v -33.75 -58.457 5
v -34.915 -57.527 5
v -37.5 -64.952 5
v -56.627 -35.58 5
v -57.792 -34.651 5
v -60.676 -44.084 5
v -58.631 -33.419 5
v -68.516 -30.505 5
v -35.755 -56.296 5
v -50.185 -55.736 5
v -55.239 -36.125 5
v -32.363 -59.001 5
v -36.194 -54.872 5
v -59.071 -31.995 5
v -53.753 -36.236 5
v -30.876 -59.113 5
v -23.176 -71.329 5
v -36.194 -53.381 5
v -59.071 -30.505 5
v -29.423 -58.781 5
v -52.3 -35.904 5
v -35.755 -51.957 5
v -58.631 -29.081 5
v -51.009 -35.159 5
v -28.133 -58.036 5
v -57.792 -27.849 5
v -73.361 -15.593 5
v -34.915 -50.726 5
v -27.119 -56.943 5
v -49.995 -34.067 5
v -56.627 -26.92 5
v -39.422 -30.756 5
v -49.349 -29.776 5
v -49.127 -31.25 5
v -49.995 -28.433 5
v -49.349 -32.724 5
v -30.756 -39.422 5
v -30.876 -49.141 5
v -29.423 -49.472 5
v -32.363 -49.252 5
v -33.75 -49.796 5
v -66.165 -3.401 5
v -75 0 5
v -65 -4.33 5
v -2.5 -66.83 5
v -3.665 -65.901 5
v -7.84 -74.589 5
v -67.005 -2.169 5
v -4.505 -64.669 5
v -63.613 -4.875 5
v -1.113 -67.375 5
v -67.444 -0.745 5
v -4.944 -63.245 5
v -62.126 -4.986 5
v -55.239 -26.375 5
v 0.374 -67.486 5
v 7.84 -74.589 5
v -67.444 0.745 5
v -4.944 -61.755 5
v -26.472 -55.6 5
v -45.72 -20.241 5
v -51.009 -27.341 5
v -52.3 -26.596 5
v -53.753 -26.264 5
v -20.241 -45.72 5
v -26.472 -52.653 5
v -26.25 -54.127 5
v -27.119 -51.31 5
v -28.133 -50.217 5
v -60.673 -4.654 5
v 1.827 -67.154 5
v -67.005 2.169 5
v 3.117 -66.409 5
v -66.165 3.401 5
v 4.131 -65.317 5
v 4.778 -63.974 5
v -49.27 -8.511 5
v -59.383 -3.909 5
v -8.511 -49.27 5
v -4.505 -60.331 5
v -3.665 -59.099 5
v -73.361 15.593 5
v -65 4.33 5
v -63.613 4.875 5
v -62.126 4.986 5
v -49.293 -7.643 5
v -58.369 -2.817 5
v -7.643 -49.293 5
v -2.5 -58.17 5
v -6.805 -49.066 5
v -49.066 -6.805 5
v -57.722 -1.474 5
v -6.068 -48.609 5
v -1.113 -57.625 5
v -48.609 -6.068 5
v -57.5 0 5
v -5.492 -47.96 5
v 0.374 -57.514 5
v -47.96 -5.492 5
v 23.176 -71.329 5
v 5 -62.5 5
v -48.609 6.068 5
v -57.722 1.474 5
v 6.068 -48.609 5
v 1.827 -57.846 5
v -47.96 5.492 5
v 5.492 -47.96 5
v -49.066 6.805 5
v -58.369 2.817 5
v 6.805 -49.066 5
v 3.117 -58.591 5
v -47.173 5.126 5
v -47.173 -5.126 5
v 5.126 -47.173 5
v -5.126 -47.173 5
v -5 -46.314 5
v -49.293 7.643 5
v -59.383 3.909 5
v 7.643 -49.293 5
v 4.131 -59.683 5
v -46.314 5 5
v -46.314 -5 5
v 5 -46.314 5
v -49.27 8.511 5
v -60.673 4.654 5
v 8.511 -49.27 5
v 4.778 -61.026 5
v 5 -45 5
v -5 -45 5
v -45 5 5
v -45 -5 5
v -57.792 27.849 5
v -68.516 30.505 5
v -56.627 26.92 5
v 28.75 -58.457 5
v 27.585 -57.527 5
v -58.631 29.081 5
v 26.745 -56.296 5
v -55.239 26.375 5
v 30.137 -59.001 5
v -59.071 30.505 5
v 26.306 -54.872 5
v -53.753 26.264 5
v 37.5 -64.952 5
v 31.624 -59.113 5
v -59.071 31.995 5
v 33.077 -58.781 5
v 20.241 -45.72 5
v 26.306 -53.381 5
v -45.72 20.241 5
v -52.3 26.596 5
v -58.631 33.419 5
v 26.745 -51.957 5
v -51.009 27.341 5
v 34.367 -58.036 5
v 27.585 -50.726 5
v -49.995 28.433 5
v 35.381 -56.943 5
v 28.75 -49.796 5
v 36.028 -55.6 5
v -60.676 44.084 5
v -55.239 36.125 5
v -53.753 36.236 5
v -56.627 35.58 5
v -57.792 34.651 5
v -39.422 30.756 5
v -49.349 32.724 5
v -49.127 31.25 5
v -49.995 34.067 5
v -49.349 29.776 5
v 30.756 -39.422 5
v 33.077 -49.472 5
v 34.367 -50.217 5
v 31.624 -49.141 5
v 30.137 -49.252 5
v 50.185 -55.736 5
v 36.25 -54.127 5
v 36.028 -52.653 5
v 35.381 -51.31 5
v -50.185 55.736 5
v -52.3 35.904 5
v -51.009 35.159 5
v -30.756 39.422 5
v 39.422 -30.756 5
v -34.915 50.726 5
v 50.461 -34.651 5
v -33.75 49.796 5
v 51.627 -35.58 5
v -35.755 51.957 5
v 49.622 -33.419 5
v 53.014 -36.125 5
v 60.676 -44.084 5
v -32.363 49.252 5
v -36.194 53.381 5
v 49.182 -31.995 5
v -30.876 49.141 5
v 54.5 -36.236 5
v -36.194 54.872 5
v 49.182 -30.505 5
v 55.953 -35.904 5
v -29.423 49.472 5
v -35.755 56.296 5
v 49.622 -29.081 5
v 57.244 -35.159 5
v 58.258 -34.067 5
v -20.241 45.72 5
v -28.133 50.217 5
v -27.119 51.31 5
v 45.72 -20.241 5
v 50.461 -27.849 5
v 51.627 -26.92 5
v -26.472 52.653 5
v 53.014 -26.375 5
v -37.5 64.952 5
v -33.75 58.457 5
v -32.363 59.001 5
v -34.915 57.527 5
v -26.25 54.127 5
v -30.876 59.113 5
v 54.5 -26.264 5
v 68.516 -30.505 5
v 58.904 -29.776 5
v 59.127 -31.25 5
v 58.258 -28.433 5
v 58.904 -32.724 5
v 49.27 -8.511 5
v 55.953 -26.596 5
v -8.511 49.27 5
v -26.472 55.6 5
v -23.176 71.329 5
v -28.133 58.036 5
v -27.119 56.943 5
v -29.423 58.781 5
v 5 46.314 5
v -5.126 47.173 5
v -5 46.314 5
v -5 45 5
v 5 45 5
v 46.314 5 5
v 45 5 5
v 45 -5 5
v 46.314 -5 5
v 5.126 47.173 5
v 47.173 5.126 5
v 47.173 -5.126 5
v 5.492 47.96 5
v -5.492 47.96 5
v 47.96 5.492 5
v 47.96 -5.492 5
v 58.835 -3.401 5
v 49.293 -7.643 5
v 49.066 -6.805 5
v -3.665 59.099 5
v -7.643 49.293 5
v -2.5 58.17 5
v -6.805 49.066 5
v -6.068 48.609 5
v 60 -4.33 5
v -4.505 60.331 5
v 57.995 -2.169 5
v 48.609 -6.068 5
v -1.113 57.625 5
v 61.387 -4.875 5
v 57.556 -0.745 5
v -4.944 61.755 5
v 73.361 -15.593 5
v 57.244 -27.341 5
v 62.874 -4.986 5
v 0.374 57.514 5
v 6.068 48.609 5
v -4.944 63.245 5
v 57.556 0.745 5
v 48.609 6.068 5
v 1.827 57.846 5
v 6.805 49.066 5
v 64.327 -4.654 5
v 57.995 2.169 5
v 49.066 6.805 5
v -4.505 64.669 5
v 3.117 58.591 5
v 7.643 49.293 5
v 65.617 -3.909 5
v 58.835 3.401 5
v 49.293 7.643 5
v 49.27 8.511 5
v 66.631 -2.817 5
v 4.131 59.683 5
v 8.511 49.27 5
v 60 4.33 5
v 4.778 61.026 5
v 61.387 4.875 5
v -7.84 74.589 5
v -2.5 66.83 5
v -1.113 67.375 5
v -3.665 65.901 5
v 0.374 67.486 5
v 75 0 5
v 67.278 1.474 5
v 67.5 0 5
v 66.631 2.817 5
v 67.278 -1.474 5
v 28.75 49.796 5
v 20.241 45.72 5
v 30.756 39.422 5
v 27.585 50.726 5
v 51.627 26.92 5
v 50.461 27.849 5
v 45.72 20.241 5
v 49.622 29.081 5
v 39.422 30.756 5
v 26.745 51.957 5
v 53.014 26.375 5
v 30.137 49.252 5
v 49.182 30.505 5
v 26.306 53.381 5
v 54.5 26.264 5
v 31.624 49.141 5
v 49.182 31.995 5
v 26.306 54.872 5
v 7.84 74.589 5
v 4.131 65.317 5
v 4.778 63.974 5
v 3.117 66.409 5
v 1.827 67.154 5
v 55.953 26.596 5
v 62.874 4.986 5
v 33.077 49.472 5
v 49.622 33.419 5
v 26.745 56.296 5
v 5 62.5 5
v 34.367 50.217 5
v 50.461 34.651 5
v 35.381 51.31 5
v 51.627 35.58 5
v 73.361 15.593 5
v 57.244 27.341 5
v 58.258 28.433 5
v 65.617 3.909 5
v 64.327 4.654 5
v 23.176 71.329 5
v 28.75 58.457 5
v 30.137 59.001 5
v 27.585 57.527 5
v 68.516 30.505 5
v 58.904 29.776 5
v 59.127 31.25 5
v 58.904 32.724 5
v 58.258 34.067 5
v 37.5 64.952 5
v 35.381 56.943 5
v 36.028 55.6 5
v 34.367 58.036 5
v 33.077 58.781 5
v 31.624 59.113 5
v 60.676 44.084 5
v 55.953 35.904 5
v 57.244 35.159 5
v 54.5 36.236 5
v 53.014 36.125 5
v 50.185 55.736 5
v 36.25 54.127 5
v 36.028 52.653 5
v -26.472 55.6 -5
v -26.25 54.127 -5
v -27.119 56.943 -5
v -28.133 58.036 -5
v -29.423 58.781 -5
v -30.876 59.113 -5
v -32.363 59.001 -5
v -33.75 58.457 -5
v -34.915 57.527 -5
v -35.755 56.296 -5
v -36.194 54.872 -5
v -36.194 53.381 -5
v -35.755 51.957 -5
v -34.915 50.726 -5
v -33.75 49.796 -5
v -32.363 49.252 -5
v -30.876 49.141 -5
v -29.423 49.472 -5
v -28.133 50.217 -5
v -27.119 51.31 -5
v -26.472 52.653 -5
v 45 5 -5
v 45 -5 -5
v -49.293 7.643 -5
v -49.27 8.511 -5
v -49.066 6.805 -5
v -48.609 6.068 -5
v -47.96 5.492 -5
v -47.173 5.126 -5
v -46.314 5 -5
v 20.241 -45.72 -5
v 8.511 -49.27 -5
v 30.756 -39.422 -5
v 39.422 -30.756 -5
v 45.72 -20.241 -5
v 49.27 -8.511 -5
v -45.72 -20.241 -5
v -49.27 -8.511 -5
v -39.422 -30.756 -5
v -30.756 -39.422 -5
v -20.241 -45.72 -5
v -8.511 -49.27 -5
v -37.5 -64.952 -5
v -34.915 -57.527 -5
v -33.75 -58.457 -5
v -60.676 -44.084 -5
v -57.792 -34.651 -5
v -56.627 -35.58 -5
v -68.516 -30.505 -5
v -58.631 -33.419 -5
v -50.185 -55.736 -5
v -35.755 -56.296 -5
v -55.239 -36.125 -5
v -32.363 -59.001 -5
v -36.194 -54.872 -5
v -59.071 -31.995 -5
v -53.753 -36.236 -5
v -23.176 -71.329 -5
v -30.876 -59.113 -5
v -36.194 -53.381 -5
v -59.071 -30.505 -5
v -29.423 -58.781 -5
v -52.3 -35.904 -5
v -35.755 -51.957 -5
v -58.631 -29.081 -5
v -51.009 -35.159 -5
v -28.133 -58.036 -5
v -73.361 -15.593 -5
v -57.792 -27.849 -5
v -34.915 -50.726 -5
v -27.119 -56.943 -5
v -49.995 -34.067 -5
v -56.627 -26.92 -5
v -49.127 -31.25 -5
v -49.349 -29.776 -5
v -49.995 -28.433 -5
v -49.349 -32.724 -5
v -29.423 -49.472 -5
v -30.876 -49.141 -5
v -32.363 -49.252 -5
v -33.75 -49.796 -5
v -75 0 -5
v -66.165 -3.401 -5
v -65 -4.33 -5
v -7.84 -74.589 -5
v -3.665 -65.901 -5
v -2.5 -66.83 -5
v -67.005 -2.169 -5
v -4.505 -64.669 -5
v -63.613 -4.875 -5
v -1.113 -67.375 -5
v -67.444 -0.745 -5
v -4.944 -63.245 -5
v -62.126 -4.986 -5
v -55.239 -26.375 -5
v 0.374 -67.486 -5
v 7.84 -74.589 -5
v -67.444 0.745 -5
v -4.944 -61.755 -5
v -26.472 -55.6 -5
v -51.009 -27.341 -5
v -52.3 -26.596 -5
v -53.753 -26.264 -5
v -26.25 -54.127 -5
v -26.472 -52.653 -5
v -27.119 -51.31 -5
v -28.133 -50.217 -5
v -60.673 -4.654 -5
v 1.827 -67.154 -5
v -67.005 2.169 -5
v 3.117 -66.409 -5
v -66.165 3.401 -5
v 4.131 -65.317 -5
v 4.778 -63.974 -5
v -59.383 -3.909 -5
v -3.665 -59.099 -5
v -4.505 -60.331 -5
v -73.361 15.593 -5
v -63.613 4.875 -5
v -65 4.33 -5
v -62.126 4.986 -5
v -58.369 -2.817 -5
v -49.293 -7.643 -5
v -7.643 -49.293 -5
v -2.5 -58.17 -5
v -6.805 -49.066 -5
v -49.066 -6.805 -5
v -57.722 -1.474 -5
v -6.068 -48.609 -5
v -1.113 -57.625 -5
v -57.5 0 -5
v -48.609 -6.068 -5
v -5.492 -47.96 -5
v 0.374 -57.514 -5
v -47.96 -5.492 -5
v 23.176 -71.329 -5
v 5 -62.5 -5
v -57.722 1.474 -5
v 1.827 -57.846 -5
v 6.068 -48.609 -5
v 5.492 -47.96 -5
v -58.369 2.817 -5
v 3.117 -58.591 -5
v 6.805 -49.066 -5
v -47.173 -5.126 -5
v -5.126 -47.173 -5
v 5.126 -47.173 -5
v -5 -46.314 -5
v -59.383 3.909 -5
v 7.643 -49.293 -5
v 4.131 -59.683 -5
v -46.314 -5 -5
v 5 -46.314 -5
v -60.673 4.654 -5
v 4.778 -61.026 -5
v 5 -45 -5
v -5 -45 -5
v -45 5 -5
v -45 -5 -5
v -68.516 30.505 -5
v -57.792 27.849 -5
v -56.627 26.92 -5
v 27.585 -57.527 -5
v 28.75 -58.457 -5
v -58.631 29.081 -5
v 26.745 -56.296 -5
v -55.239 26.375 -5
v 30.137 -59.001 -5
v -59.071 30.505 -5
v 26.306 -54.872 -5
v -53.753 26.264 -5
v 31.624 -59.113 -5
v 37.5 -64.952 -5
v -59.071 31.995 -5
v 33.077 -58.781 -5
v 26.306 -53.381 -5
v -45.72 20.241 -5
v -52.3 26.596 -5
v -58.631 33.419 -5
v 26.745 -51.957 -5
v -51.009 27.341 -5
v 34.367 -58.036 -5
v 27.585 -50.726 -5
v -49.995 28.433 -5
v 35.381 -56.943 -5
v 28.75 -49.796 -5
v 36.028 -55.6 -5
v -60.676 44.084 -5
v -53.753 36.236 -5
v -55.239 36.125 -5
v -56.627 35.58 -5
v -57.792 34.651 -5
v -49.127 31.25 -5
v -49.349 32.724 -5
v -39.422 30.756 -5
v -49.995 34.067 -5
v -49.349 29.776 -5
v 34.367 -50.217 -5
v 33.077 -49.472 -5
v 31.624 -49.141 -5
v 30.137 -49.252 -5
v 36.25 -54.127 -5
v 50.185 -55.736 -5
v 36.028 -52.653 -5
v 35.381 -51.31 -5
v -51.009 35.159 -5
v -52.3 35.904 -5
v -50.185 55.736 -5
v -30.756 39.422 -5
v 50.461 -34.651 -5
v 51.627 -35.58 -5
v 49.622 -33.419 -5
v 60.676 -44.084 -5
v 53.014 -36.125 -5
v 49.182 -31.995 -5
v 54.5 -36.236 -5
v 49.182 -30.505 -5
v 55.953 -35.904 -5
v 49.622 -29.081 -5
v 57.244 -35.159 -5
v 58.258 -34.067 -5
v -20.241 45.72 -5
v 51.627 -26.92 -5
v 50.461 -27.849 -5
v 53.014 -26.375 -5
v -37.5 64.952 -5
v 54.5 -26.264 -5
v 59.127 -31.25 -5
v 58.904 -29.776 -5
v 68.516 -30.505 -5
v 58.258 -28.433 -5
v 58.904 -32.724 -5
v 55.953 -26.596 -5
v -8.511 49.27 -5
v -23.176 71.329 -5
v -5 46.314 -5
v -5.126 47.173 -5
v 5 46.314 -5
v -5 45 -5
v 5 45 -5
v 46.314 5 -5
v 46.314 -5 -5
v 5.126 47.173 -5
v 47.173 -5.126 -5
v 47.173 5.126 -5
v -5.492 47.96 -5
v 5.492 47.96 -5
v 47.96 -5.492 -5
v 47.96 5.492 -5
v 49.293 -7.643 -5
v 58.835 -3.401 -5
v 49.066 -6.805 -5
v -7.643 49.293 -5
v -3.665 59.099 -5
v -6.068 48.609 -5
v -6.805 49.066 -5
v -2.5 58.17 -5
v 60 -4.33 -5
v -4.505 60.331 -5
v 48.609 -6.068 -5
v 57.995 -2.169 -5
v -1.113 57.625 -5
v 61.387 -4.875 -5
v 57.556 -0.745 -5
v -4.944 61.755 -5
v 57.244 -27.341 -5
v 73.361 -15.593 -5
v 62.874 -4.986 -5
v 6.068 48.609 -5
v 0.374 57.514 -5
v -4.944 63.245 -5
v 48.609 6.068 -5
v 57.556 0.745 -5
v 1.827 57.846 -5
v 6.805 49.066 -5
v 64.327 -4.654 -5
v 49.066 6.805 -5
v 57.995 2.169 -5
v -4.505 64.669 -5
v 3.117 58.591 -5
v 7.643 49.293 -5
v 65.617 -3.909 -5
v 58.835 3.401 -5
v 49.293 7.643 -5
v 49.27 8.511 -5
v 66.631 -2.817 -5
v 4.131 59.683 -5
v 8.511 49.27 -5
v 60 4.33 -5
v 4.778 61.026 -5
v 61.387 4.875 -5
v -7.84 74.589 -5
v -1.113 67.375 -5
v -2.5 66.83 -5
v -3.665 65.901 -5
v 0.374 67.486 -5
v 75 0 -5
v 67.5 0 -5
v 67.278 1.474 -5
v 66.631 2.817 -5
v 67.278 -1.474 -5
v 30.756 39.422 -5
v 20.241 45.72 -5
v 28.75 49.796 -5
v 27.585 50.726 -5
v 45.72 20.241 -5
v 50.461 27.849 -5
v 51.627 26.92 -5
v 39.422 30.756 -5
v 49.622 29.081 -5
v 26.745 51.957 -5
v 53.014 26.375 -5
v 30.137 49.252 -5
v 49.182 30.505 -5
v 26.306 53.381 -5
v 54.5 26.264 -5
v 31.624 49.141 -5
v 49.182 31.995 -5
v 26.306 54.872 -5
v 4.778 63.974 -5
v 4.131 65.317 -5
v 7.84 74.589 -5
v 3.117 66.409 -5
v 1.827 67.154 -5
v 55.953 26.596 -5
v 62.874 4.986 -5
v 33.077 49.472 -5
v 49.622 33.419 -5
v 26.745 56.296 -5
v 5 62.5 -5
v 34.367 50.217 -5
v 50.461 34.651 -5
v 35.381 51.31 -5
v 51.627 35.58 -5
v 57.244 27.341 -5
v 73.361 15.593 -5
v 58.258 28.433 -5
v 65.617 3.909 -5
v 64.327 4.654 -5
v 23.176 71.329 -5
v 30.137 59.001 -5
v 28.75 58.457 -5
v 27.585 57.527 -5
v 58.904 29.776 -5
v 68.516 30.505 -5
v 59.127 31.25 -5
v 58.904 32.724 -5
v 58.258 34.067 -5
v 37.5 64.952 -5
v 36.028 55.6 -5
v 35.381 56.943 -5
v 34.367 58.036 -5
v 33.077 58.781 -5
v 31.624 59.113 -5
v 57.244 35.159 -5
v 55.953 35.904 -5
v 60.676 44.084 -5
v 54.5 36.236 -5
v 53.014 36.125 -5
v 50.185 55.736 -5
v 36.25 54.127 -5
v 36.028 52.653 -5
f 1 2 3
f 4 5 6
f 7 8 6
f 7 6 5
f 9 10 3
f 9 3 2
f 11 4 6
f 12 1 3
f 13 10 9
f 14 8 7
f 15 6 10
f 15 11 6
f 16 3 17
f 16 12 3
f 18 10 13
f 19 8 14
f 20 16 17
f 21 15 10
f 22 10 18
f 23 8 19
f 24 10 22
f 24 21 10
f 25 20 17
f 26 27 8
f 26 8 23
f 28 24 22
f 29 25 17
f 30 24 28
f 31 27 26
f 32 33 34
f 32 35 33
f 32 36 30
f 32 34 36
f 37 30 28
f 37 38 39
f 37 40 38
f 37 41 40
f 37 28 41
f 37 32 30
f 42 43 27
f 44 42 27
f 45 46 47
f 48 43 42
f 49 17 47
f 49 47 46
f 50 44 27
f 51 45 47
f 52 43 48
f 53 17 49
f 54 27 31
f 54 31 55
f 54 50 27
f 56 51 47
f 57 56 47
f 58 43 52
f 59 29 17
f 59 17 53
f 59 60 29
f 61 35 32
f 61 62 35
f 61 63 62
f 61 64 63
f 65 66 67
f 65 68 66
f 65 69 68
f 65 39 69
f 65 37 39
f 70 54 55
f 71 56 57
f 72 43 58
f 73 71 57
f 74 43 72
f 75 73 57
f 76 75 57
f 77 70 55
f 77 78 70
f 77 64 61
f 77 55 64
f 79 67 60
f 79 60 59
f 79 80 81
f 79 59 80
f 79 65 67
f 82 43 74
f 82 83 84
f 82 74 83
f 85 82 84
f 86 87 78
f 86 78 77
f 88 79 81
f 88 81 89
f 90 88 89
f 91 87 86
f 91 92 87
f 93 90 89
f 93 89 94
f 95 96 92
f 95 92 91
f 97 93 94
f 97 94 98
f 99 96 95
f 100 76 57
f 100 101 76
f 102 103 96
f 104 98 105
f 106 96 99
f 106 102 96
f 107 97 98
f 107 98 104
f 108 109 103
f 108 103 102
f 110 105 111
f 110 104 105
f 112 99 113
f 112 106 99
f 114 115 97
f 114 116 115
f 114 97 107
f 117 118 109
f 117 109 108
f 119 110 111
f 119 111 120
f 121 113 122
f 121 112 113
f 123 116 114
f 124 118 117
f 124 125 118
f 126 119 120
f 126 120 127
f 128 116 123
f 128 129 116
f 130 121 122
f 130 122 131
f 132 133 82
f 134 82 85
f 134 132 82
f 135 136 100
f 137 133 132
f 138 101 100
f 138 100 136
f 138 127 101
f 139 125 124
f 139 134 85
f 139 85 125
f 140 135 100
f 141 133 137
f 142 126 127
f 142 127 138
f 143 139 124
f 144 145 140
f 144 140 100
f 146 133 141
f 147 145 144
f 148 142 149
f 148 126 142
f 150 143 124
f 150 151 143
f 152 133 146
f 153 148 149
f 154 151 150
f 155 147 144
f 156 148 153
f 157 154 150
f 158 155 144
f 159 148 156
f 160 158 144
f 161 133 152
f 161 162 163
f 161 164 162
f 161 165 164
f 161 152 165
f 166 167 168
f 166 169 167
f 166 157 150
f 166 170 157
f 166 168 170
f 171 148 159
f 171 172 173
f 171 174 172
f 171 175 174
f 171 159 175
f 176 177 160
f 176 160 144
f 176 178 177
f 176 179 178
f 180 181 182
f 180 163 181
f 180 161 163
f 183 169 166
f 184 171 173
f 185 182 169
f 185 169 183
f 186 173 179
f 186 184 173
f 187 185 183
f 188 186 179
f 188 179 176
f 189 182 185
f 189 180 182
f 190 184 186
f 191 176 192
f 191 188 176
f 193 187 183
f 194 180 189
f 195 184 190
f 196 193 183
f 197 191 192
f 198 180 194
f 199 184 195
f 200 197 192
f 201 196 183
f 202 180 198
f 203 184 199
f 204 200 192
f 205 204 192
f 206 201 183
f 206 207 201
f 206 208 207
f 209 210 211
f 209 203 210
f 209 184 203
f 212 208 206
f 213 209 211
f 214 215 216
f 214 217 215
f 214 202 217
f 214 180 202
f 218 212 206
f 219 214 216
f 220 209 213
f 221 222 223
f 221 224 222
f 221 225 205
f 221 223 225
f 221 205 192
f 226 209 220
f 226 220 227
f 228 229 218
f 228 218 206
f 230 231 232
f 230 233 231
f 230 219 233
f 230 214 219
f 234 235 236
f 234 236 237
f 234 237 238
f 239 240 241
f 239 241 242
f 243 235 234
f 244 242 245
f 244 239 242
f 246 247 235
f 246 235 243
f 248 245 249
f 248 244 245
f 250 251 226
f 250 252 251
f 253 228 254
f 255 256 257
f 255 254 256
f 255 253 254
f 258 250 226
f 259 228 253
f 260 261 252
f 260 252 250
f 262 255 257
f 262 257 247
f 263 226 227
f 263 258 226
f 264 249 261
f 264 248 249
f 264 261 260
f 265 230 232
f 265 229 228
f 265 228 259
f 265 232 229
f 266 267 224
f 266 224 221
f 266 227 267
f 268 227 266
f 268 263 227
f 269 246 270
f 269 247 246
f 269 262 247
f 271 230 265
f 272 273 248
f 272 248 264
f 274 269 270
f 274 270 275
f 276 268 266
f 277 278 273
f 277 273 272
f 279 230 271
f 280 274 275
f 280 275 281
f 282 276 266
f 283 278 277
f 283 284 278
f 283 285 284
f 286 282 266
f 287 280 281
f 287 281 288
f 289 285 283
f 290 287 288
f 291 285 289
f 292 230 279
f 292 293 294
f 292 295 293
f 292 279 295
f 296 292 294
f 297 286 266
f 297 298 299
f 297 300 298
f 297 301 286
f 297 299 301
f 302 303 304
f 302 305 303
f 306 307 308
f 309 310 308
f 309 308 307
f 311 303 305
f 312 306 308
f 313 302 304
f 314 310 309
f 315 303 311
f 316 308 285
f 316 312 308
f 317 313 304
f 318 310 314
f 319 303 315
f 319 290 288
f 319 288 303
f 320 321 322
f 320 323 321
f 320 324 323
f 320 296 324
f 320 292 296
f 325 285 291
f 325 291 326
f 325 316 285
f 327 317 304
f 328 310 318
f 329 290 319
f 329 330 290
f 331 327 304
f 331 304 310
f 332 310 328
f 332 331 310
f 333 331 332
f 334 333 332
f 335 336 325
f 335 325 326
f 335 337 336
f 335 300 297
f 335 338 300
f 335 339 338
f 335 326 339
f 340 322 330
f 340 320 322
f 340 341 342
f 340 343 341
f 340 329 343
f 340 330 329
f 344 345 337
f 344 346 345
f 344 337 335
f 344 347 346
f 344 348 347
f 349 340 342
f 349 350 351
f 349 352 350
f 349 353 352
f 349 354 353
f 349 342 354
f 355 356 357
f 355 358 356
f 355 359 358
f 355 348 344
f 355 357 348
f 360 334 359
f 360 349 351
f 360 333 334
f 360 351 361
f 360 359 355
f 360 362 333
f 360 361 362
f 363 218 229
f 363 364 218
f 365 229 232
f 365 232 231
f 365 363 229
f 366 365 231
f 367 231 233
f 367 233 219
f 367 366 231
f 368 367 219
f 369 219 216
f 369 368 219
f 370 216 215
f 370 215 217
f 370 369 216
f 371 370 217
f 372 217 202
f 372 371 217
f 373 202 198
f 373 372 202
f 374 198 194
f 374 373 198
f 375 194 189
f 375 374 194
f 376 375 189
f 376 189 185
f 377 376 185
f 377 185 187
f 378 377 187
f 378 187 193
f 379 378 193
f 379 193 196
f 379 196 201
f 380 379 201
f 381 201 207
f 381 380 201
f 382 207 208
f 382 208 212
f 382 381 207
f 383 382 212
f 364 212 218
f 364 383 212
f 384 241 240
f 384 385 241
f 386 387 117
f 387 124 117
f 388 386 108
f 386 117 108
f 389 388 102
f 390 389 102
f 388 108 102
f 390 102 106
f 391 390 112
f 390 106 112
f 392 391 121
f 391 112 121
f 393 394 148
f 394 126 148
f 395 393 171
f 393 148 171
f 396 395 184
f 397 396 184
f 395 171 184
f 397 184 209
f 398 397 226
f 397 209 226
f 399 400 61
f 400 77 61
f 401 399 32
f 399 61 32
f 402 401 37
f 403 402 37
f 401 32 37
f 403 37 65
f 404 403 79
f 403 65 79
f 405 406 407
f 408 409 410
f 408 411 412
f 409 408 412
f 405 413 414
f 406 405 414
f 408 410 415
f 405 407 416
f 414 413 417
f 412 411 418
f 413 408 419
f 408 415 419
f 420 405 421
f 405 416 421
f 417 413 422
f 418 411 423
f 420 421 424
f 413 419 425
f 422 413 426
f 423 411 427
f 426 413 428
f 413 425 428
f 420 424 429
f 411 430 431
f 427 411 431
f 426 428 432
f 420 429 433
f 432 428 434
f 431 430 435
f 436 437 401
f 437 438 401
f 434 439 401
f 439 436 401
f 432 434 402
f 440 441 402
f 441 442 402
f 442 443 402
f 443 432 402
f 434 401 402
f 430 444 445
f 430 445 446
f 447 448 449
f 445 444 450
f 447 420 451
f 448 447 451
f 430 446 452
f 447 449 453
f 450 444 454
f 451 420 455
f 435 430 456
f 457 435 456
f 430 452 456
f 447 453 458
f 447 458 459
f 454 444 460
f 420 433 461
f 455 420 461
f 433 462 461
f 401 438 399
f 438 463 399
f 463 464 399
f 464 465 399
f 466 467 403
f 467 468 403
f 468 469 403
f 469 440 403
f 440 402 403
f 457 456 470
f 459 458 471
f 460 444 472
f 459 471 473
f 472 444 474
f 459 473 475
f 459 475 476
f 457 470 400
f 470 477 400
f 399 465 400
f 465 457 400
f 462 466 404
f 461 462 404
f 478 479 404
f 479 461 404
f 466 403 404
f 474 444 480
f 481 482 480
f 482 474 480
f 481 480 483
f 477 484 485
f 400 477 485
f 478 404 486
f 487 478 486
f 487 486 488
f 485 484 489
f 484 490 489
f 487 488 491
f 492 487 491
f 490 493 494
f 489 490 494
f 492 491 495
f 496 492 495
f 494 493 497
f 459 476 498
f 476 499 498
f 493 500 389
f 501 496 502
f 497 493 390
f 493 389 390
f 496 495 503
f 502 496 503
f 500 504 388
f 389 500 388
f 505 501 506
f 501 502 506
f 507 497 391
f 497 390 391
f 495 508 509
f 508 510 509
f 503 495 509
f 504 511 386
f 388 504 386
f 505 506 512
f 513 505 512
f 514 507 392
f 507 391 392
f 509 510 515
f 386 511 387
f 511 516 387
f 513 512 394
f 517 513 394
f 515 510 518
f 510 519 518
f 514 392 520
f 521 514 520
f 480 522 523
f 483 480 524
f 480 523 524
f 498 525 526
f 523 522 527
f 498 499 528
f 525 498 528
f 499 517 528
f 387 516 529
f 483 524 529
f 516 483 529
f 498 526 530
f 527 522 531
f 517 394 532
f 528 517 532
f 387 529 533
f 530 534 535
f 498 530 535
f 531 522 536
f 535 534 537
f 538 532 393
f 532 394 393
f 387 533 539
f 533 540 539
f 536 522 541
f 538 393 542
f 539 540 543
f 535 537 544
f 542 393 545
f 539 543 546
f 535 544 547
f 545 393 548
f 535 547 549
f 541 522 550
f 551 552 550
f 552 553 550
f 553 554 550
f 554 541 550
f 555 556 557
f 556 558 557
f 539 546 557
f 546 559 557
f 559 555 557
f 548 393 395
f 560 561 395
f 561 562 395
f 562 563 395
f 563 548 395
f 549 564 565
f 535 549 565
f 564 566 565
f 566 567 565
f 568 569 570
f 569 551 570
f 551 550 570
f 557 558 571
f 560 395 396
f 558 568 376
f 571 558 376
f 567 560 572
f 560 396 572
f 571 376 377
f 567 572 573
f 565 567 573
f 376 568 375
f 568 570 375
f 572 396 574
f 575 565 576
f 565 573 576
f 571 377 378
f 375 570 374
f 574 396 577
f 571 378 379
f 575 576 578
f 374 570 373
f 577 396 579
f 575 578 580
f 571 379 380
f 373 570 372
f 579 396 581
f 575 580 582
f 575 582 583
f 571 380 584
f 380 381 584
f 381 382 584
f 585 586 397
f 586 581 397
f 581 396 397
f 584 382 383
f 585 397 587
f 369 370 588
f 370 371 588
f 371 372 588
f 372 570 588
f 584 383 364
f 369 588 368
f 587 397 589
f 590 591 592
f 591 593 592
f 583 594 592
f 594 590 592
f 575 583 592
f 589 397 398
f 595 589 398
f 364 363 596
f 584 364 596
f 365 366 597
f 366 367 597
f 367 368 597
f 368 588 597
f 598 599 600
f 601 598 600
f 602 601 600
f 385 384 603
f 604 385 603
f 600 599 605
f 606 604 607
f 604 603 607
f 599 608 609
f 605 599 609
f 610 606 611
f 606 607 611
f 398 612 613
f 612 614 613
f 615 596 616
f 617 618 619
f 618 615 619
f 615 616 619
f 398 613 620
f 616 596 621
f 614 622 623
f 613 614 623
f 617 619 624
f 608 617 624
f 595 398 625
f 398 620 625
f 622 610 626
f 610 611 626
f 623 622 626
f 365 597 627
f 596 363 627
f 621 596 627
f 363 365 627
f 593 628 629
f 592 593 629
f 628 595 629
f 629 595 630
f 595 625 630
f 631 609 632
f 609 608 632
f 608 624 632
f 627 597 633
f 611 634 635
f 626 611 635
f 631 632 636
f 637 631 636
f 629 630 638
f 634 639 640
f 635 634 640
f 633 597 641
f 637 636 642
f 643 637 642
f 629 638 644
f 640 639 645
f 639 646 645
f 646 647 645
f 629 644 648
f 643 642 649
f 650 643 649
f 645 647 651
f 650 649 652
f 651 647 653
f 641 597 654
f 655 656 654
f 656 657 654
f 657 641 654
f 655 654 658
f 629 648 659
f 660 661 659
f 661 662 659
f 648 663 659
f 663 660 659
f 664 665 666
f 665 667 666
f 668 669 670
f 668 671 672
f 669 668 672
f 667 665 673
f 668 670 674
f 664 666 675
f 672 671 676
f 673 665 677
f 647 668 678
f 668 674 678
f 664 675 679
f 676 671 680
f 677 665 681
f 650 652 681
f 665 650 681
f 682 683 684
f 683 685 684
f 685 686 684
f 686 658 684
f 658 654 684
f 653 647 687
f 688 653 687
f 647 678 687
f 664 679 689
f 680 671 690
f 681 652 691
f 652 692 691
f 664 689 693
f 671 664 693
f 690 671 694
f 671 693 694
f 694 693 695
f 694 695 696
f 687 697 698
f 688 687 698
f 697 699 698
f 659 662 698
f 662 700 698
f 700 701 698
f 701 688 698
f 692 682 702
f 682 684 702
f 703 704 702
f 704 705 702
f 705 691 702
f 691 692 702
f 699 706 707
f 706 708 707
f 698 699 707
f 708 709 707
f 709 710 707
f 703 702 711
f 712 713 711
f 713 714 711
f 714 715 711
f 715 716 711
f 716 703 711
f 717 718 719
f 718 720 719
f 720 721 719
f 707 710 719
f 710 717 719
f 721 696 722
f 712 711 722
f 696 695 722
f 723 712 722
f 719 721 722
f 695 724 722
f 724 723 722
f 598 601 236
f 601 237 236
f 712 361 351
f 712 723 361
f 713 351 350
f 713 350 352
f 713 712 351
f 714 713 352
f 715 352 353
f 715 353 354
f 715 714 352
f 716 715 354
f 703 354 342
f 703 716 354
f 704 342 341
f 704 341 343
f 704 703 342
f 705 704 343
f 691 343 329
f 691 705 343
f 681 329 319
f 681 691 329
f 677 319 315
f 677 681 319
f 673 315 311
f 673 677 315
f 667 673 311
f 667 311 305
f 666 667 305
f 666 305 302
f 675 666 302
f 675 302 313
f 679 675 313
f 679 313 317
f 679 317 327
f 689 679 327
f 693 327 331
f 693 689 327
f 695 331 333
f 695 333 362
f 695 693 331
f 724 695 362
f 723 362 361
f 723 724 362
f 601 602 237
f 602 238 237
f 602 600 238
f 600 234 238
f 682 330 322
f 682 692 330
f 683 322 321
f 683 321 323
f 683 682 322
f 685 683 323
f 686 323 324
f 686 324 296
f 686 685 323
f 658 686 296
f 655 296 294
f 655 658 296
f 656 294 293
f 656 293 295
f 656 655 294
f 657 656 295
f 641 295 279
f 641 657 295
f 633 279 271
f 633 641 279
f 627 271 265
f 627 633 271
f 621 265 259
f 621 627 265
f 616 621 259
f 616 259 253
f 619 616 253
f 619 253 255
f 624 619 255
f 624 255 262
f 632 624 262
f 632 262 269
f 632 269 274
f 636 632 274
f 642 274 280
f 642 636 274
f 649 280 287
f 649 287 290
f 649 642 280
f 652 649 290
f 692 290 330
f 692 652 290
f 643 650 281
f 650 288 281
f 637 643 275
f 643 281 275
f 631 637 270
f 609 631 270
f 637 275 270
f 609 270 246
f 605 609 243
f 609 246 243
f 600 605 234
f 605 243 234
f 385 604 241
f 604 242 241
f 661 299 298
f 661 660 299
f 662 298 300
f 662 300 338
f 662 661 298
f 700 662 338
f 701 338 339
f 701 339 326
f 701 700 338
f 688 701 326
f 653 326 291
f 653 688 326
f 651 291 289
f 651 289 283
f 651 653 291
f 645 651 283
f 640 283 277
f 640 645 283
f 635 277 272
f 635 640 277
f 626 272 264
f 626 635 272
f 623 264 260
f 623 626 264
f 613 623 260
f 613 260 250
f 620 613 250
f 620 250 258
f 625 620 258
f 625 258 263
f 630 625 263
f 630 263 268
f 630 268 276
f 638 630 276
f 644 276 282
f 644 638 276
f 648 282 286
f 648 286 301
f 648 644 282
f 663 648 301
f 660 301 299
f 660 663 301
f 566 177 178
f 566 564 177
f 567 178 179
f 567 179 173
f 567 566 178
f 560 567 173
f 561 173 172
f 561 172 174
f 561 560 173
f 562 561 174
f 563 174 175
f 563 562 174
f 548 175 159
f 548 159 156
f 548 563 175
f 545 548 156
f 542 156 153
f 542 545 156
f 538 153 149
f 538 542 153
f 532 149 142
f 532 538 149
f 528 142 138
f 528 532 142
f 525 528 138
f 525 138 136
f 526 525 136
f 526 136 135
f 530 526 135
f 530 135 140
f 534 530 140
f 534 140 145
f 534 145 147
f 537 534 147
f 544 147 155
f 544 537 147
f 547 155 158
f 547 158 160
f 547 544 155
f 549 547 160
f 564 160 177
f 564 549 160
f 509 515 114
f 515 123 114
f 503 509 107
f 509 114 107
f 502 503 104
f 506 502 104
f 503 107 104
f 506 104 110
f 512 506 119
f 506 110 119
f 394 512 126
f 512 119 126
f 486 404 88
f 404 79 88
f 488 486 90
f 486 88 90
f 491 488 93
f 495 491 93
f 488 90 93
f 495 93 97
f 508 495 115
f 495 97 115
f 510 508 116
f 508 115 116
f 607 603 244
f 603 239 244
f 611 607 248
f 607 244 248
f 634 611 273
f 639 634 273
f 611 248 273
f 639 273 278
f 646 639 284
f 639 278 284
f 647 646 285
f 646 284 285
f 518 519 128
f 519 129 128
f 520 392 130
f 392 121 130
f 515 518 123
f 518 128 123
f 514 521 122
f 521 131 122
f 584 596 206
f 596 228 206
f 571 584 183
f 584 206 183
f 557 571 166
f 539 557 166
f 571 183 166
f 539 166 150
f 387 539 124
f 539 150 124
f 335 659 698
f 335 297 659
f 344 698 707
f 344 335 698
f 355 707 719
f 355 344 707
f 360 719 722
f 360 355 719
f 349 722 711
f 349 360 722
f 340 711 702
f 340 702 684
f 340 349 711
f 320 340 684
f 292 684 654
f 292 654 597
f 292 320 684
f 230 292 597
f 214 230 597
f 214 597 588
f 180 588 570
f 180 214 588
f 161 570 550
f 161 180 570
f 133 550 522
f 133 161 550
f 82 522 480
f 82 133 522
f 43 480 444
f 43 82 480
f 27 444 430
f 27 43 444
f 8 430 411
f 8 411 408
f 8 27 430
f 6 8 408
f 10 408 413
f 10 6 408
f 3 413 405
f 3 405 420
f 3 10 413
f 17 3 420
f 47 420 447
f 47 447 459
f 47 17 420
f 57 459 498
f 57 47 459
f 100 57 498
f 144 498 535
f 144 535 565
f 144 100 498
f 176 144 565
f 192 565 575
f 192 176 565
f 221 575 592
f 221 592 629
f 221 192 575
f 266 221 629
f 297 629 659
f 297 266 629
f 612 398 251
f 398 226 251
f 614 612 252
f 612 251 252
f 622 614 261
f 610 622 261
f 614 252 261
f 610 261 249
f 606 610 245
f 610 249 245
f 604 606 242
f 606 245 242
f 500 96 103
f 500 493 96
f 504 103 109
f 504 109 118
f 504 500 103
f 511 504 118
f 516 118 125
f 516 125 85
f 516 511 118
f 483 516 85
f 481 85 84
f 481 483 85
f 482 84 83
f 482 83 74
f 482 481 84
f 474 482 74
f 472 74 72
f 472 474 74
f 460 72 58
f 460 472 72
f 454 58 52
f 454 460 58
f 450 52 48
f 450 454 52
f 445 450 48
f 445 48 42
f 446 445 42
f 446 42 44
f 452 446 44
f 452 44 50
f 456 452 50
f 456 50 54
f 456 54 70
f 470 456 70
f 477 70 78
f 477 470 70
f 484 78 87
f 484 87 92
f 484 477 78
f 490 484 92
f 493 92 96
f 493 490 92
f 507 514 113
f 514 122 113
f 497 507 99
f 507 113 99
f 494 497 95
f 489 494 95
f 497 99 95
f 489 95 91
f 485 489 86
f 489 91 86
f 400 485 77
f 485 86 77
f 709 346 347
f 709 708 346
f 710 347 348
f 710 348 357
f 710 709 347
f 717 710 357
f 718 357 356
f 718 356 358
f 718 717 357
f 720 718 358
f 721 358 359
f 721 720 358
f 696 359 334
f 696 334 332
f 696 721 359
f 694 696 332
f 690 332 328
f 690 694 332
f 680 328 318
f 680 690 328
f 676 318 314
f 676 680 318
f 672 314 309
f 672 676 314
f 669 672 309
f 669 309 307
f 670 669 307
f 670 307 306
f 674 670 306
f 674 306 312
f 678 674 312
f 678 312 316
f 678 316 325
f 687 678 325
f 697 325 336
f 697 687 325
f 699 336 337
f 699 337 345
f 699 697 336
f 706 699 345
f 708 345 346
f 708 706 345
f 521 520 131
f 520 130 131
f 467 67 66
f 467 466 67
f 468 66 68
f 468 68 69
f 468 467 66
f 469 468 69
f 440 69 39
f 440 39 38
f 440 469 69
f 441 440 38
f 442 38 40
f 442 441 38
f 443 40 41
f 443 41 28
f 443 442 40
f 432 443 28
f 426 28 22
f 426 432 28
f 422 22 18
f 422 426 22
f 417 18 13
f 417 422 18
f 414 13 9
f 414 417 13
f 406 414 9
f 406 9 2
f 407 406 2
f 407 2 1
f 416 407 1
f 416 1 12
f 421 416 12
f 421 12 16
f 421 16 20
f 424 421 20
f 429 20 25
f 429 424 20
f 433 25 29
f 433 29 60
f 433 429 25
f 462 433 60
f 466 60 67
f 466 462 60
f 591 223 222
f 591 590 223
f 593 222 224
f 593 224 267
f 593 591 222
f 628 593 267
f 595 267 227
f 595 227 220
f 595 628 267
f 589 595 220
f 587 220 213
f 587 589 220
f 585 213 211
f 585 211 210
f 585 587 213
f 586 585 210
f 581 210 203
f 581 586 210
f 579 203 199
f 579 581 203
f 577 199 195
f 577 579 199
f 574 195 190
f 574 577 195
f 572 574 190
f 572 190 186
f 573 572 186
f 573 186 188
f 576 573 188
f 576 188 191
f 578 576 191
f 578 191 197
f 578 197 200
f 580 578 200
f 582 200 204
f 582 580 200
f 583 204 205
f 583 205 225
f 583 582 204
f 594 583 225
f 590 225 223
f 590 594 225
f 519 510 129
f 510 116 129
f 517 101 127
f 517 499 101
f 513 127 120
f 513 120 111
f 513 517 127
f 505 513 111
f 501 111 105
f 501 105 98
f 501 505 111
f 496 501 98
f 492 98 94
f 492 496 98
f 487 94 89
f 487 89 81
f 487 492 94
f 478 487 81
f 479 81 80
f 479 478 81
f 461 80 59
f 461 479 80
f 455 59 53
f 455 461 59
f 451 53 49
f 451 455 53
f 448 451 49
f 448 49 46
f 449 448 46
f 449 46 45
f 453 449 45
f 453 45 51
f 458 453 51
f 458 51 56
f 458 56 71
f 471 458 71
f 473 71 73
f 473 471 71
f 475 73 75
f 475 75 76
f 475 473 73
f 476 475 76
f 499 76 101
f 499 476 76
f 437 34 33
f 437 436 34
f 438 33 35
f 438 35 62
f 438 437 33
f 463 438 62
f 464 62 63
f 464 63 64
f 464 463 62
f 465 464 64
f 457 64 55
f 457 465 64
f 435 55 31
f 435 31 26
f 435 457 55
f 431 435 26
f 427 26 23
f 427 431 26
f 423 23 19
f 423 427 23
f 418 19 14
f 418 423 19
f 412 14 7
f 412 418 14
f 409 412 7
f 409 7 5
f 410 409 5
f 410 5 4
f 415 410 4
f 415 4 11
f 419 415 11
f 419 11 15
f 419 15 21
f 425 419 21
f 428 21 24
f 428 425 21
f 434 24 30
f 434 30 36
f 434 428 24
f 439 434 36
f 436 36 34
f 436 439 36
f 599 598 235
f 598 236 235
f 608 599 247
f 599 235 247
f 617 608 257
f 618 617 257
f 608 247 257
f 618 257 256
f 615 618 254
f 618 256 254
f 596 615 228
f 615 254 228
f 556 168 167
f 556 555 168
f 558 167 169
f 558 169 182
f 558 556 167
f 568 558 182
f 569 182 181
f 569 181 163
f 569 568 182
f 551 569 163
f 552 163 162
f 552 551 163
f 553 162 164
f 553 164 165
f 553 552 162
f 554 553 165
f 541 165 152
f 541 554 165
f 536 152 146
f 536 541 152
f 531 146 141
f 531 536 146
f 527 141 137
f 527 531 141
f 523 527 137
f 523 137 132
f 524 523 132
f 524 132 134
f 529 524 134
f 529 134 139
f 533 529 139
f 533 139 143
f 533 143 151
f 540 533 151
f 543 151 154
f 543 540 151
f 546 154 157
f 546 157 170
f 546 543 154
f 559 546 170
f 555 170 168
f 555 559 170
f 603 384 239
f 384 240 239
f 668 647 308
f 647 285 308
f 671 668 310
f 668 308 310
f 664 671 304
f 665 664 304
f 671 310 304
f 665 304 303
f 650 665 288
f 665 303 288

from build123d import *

# Parameters (mm, degrees)
SKETCH1_R           = 75
SKETCH1_R_2         = 5
BOSS_EXTRUDE1_DEPTH = 5


with BuildPart() as part:
    # Sketch1 → Boss-Extrude1 (new, symmetric)
    with BuildSketch(Plane.XY):
        Circle(SKETCH1_R)
        with Locations((62.5, 0)):
            Circle(SKETCH1_R_2, mode=Mode.SUBTRACT)
        with Locations((54.126587737, -31.25)):
            Circle(SKETCH1_R_2, mode=Mode.SUBTRACT)
        with Locations((31.25, -54.126587737)):
            Circle(SKETCH1_R_2, mode=Mode.SUBTRACT)
        with Locations((0, -62.5)):
            Circle(SKETCH1_R_2, mode=Mode.SUBTRACT)
        with Locations((-31.25, -54.126587737)):
            Circle(SKETCH1_R_2, mode=Mode.SUBTRACT)
        with Locations((-54.126587737, -31.25)):
            Circle(SKETCH1_R_2, mode=Mode.SUBTRACT)
        with Locations((-62.5, 0)):
            Circle(SKETCH1_R_2, mode=Mode.SUBTRACT)
        with Locations((-54.126587737, 31.25)):
            Circle(SKETCH1_R_2, mode=Mode.SUBTRACT)
        with Locations((-31.25, 54.126587737)):
            Circle(SKETCH1_R_2, mode=Mode.SUBTRACT)
        with Locations((0, 62.5)):
            Circle(SKETCH1_R_2, mode=Mode.SUBTRACT)
        with Locations((31.25, 54.126587737)):
            Circle(SKETCH1_R_2, mode=Mode.SUBTRACT)
        with Locations((54.126587737, 31.25)):
            Circle(SKETCH1_R_2, mode=Mode.SUBTRACT)
        with BuildLine():
            Line((45, 5), (46.314144708, 5))
            ThreePointArc((46.314144708, 5), (48.608912113, 6.067632914), (49.27036671, 8.510638298))
            ThreePointArc((49.27036671, 8.510638298), (35.355339059, 35.355339059), (8.510638298, 49.27036671))
            ThreePointArc((8.510638298, 49.27036671), (6.067632914, 48.608912113), (5, 46.314144708))
            Line((5, 46.314144708), (5, 45))
            Line((5, 45), (-5, 45))
            Line((-5, 45), (-5, 46.314144708))
            ThreePointArc((-5, 46.314144708), (-6.067632914, 48.608912113), (-8.510638298, 49.27036671))
            ThreePointArc((-8.510638298, 49.27036671), (-35.355339059, 35.355339059), (-49.27036671, 8.510638298))
            ThreePointArc((-49.27036671, 8.510638298), (-48.608912113, 6.067632914), (-46.314144708, 5))
            Line((-46.314144708, 5), (-45, 5))
            Line((-45, 5), (-45, -5))
            Line((-45, -5), (-46.314144708, -5))
            ThreePointArc((-46.314144708, -5), (-48.608912113, -6.067632914), (-49.27036671, -8.510638298))
            ThreePointArc((-49.27036671, -8.510638298), (-35.355339059, -35.355339059), (-8.510638298, -49.27036671))
            ThreePointArc((-8.510638298, -49.27036671), (-6.067632914, -48.608912113), (-5, -46.314144708))
            Line((-5, -46.314144708), (-5, -45))
            Line((-5, -45), (5, -45))
            Line((5, -45), (5, -46.314144708))
            ThreePointArc((5, -46.314144708), (6.067632914, -48.608912113), (8.510638298, -49.27036671))
            ThreePointArc((8.510638298, -49.27036671), (35.355339059, -35.355339059), (49.27036671, -8.510638298))
            ThreePointArc((49.27036671, -8.510638298), (48.608912113, -6.067632914), (46.314144708, -5))
            Line((46.314144708, -5), (45, -5))
            Line((45, -5), (45, 5))
        make_face(mode=Mode.SUBTRACT)
    extrude(amount=BOSS_EXTRUDE1_DEPTH, both=True)


solid = part.part
